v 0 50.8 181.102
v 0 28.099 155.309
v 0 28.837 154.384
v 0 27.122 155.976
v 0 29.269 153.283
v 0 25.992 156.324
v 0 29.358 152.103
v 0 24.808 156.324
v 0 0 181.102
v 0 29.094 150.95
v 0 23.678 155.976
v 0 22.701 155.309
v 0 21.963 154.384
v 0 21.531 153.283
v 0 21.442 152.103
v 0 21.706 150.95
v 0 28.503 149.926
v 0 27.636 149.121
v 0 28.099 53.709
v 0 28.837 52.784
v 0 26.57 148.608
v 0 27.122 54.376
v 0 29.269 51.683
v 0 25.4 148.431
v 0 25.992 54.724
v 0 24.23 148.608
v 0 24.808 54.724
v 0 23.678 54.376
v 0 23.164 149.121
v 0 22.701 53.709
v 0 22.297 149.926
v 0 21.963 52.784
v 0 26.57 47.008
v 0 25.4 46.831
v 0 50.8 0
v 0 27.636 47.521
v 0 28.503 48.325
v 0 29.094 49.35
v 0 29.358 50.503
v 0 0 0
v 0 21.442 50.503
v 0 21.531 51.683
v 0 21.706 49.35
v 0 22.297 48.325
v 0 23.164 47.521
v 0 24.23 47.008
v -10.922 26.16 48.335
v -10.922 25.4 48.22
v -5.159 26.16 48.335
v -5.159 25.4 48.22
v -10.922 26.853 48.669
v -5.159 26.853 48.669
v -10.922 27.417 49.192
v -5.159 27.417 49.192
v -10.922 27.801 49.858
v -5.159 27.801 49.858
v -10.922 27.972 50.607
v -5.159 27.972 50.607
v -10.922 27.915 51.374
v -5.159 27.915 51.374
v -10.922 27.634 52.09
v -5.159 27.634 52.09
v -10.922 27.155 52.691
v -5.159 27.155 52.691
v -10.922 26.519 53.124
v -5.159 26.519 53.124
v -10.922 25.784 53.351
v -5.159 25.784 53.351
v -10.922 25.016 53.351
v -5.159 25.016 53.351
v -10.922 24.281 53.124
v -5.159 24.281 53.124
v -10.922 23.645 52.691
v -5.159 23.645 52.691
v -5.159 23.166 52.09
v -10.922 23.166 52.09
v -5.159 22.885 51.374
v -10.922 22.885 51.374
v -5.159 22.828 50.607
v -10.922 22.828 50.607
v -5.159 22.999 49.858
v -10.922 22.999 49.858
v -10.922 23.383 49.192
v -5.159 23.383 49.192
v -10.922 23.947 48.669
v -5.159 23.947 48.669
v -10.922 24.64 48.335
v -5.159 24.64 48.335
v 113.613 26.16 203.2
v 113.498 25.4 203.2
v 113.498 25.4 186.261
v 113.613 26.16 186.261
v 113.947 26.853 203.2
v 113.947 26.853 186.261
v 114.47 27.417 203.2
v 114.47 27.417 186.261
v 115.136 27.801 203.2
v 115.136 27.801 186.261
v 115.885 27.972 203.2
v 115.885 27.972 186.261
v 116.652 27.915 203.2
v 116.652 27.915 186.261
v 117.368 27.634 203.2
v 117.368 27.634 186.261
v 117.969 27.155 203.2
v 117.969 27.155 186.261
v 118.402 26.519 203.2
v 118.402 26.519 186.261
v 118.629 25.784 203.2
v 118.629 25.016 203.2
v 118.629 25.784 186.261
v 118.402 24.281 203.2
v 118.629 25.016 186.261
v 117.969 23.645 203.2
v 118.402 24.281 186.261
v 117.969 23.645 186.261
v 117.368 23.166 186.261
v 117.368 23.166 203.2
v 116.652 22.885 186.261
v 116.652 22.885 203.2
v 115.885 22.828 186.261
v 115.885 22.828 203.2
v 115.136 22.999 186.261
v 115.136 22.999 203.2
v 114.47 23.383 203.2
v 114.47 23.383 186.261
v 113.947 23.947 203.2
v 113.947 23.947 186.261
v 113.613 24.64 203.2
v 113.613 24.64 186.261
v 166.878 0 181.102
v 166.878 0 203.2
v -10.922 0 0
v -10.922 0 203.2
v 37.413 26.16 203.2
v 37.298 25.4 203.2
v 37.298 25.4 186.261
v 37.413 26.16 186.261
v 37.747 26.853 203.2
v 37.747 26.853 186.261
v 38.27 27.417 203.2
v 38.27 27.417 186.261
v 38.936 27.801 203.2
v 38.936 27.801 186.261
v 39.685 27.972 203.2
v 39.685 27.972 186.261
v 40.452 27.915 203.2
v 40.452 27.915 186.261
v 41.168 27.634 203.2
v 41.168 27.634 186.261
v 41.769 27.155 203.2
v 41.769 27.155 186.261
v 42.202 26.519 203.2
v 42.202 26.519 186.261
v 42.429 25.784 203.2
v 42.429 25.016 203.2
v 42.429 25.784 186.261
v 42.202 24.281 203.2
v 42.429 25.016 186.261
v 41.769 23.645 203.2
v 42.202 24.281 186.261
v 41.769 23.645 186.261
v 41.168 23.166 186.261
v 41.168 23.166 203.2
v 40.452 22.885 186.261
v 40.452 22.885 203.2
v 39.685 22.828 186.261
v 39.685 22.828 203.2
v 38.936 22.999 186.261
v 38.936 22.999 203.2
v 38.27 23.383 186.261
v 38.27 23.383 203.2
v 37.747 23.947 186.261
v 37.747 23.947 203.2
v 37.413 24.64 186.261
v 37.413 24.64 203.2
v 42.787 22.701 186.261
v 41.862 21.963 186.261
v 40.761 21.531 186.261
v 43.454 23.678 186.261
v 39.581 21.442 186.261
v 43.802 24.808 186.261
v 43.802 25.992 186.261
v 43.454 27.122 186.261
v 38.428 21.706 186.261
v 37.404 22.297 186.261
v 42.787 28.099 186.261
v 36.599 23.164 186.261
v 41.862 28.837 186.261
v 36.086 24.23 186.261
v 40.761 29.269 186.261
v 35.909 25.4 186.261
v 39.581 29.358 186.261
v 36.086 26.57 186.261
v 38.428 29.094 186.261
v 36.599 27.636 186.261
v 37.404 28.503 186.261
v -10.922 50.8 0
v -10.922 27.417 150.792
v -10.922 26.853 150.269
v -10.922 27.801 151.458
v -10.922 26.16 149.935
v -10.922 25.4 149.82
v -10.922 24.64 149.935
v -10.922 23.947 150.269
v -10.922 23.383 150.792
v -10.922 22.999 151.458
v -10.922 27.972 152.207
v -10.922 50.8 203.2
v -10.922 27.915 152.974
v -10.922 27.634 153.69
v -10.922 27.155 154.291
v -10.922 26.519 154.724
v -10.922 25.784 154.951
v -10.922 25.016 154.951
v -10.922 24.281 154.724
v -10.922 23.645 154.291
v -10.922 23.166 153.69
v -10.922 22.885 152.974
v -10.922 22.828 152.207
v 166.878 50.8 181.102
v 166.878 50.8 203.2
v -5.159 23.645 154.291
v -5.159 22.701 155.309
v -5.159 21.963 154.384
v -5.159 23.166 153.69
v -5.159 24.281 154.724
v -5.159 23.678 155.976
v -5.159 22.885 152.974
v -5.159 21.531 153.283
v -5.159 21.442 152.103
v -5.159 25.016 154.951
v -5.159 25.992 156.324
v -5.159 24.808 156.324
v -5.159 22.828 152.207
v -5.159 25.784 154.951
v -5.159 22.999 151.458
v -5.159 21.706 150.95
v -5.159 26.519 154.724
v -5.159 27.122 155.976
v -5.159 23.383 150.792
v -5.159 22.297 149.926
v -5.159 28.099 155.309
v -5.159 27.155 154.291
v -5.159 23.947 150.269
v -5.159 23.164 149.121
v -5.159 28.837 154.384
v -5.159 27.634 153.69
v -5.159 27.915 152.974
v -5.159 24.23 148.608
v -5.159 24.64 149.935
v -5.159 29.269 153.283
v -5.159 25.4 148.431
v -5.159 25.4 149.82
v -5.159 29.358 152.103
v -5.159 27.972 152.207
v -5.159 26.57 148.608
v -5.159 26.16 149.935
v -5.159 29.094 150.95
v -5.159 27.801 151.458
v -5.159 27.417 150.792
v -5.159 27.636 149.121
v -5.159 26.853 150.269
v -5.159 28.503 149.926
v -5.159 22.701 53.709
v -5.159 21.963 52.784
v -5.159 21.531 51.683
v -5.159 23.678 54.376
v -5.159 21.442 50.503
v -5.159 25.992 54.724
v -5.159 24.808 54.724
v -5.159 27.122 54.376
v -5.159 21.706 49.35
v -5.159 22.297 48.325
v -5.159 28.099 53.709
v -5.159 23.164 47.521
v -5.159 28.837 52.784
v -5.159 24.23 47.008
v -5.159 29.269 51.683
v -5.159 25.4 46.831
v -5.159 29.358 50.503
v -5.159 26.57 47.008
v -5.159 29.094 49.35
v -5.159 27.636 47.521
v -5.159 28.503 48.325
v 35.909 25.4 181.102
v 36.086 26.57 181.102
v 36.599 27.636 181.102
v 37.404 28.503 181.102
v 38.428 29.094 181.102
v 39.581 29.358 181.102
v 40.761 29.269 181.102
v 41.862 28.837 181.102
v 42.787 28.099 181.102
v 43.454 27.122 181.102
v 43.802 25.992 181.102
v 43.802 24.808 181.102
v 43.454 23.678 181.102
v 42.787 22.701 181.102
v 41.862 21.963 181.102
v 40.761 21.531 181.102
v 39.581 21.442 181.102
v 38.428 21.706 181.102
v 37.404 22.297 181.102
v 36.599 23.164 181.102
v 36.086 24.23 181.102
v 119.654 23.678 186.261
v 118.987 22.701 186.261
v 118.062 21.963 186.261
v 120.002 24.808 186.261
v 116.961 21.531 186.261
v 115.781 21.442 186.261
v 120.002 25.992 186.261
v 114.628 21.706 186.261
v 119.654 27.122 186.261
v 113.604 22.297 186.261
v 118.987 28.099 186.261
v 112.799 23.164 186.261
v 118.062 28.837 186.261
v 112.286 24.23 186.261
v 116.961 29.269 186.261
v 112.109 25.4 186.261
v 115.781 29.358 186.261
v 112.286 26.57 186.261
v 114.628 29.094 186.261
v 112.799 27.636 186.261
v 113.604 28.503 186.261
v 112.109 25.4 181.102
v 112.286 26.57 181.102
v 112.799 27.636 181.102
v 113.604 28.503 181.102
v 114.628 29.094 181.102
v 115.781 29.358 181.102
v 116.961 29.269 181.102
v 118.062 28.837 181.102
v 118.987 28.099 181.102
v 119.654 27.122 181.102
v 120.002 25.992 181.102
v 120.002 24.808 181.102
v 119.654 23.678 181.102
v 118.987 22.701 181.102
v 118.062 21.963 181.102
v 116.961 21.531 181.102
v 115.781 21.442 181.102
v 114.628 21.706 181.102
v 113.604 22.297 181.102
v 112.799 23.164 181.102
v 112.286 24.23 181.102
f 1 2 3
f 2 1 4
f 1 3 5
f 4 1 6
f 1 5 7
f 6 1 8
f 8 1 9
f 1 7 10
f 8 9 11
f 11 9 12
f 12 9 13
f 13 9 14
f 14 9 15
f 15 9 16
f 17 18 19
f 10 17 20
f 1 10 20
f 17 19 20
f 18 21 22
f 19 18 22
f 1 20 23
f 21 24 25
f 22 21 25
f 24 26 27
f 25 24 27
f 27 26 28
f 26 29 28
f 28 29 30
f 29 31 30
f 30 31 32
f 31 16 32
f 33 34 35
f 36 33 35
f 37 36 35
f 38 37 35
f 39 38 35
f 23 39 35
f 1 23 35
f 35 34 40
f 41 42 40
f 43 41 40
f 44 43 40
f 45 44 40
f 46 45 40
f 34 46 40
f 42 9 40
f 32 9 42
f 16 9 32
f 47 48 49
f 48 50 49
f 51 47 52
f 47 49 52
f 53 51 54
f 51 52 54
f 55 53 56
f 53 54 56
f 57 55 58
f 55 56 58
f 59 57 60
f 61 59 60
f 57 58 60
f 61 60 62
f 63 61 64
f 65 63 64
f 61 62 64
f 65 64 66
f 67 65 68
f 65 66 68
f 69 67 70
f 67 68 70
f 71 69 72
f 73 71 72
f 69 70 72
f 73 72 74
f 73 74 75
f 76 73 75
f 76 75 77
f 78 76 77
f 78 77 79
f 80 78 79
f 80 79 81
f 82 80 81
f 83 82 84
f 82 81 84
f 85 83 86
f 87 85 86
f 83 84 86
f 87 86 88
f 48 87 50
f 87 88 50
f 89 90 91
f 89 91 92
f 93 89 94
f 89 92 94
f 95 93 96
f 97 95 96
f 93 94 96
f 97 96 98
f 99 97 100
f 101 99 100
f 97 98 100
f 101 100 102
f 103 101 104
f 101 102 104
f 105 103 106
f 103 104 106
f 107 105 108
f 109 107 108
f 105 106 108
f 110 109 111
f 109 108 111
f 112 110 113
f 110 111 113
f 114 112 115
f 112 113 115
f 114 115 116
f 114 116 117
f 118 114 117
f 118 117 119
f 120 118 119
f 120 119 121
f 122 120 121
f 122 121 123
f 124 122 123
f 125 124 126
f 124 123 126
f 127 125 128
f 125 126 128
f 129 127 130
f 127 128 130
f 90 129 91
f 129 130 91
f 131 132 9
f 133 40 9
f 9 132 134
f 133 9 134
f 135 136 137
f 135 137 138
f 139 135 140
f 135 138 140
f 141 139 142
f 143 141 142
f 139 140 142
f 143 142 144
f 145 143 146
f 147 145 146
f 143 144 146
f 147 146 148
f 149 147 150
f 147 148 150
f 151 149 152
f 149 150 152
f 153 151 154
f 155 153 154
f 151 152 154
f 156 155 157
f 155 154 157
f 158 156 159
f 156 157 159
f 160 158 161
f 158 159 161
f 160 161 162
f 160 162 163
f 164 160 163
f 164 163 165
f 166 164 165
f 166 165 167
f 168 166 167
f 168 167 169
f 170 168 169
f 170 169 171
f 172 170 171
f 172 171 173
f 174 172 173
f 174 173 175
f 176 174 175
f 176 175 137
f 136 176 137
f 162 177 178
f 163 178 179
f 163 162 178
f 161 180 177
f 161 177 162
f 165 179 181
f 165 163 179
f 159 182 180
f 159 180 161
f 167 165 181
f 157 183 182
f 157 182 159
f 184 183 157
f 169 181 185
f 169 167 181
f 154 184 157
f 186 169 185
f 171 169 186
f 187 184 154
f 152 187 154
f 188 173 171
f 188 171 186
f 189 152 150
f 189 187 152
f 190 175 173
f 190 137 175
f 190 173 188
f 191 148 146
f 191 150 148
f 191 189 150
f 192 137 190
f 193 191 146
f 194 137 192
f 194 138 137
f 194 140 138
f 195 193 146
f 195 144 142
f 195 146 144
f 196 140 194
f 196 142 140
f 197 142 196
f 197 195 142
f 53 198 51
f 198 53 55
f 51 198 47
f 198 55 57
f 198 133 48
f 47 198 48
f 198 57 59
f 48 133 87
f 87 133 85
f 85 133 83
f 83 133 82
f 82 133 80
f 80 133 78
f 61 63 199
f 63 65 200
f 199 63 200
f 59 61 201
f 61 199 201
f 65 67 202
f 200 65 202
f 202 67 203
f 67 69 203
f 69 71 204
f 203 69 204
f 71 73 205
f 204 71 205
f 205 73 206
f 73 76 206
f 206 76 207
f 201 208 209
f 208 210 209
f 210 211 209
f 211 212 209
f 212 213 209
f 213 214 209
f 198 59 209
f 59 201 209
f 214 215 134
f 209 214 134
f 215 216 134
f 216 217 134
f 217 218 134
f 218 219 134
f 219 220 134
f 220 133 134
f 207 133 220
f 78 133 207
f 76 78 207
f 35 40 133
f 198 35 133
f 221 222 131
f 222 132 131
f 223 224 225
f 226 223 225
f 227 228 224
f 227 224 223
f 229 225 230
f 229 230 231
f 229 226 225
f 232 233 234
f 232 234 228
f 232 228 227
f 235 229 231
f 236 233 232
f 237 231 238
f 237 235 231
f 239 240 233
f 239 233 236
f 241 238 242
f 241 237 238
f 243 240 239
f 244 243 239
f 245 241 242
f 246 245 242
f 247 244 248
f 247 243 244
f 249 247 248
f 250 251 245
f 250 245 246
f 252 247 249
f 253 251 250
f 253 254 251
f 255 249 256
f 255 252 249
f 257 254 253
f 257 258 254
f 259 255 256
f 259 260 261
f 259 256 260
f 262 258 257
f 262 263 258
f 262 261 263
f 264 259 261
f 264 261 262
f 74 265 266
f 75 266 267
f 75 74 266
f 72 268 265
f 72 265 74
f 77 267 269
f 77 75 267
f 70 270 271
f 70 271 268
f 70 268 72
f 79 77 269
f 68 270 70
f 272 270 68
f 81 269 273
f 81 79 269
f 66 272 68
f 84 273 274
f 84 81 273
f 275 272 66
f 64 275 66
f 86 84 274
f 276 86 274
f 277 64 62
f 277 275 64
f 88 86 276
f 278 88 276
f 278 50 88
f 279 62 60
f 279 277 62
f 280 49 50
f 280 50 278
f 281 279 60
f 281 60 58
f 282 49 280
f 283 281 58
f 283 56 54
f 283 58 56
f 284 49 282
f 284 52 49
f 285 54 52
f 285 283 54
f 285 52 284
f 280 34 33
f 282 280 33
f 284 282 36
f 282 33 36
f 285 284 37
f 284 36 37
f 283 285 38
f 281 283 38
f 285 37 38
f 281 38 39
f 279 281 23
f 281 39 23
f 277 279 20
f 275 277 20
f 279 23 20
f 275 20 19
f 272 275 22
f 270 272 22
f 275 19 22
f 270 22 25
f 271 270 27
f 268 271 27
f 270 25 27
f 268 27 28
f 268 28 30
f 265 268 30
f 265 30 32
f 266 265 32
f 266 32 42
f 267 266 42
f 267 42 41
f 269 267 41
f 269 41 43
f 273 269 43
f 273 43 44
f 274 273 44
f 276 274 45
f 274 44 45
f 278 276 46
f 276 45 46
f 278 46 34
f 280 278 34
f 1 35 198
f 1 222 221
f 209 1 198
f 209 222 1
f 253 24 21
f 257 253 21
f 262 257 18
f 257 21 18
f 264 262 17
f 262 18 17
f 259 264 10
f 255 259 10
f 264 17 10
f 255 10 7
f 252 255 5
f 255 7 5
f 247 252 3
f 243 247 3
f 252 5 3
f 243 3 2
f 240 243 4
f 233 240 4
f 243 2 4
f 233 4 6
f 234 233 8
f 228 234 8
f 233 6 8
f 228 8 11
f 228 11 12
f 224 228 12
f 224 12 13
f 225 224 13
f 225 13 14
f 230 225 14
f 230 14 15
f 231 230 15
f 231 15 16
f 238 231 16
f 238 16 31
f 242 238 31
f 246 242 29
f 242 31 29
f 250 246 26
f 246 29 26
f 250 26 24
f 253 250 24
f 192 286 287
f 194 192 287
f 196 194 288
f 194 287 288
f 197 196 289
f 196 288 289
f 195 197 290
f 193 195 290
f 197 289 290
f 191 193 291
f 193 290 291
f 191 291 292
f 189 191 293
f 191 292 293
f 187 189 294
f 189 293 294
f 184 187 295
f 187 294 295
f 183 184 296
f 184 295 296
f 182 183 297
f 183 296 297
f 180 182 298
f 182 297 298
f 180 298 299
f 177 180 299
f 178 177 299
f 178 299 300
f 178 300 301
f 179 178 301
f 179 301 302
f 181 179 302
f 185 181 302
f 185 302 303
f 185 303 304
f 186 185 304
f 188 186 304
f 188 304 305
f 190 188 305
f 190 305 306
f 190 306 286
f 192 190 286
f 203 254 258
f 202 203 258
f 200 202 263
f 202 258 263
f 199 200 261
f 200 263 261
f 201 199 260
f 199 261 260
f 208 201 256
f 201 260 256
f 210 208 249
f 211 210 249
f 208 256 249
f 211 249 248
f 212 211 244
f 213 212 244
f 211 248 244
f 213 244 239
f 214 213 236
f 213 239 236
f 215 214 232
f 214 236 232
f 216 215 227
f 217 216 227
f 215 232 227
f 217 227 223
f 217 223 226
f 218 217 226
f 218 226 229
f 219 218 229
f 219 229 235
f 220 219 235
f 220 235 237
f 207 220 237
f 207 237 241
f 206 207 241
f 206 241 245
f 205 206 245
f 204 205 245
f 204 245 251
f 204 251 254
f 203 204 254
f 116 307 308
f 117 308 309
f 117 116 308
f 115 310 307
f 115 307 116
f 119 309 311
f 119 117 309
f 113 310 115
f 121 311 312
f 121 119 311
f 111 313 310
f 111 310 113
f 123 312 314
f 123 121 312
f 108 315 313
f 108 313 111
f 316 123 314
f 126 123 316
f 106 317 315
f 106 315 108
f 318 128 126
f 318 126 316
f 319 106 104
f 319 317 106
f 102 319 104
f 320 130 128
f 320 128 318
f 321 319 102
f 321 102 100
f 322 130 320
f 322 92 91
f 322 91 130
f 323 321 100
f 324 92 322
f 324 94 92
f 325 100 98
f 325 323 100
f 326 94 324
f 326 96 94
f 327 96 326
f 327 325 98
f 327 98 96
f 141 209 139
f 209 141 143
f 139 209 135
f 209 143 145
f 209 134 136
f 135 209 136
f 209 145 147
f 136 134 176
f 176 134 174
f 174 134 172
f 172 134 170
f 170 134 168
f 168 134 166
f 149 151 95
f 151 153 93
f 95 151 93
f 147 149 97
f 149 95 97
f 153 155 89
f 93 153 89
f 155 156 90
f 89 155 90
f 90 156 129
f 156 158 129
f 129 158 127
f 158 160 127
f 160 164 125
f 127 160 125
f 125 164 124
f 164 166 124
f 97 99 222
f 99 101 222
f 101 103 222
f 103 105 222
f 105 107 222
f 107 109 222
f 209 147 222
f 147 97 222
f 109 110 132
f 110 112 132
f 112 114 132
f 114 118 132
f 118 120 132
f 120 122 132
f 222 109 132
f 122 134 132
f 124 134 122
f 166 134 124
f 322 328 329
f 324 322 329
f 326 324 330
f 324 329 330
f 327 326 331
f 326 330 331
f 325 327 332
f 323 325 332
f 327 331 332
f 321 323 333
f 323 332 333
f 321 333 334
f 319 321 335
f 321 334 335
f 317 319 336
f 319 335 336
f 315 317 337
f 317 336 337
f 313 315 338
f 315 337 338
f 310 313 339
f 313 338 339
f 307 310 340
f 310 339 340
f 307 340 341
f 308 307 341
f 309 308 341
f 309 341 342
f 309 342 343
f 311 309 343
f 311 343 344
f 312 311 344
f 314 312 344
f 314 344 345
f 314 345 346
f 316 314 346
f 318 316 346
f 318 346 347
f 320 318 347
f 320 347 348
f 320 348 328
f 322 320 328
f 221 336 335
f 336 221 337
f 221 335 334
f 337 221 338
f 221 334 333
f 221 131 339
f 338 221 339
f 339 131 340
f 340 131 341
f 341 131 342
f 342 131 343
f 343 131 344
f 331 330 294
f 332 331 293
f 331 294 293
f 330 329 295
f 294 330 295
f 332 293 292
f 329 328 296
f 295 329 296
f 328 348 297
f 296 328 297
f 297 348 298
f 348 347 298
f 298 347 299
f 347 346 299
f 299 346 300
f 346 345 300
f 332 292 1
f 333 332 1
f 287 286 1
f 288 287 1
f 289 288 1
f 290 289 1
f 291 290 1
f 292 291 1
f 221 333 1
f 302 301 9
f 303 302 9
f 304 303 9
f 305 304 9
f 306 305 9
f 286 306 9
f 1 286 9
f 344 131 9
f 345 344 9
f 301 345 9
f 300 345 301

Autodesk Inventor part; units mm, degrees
ref_plane "YZ Plane" through (0, 0, 0) normal (1, 0, 0) x (0, 1, 0)
ref_plane "XZ Plane" through (0, 0, 0) normal (0, 1, 0) x (-1, 0, 0)
ref_plane "XY Plane" through (0, 0, 0) normal (0, 0, 1) x (1, 0, 0)
sketch "Sketch1" plane through (0, 0, 0) normal (0, 1, 0) x (-1, 0, 0)
  line L0 (0, 0) -> (10.922, 0)
  line L1 (10.922, 0) -> (10.922, 203.2)
  line L2 (10.922, 203.2) -> (0, 203.2)
  line L3 (0, 203.2) -> (0, 0)
  line L4 (10.922, 203.2) -> (-166.878, 203.2)
  line L5 (-166.878, 203.2) -> (-166.878, 181.102)
  line L6 (-166.878, 181.102) -> (10.922, 181.102)
  line L7 (10.922, 181.102) -> (10.922, 203.2)
  point P0 (0, 181.102)
  dimension "d0" = 10.922
  dimension "d1" = 203.2
  dimension "d16" = 177.8
  dimension "d17" = 22.098
extrude "Extrusion1" add sketch "Sketch1" along normal blind 50.8
sketch "Sketch3" plane through (0, 0, 181.102) normal (1, 0, 0) x (0, 0, -1)
  circle A0 centre (28.702, 25.4) radius 2.5797
  circle A1 centre (130.302, 25.4) radius 2.5797
  line L0 (181.102, 0) -> (181.102, 50.8) projected
  line L1 (0, 0) -> (181.102, 0) projected
  circle A2 centre (130.302, 25.4) radius 3.9688
  circle A3 centre (28.702, 25.4) radius 3.9687
  dimension "d18" = 5.1594
  dimension "d19" = 5.1594
  dimension "d20" = 0
  dimension "d21" = 101.6
  dimension "d22" = 50.8
  dimension "d23" = 25.4
  dimension "d24" = 7.9375
  dimension "d25" = 7.9375
sketch "Sketch4" plane through (166.878, 0, 181.102) normal (0, 0, -1) x (-1, 0, 0)
  circle A0 centre (50.8, 25.4) radius 2.5797
  circle A1 centre (127, 25.4) radius 2.5797
  line L0 (0, 0) -> (0, 50.8) projected
  circle A2 centre (50.8, 25.4) radius 3.9687
  circle A3 centre (127, 25.4) radius 3.9687
  line L1 (0, 0) -> (166.878, 0) projected
  dimension "d26" = 5.1594
  dimension "d27" = 5.1594
  dimension "d28" = 0
  dimension "d29" = 76.2
  dimension "d30" = 50.8
  dimension "d31" = 7.9375
  dimension "d32" = 7.9375
  dimension "d33" = 25.4
extrude "Extrusion4" cut sketch "Sketch4" against normal through all contours A0 | A1
extrude "Extrusion5" cut sketch "Sketch4" against normal blind 5.1594 contours A0 | A1 | A2 | A3
extrude "Extrusion6" cut sketch "Sketch3" against normal blind 5.1594 contours A0 | A1 | A2 | A3
extrude "Extrusion7" cut sketch "Sketch3" against normal through all contours A0 | A1
equation "\"d19\" = d18"
equation "\"d26\" = d18"
equation "\"d27\" = d26"
equation "\"d31\" = d24"
equation "\"d32\" = d31"
properties part number "battery shim"
